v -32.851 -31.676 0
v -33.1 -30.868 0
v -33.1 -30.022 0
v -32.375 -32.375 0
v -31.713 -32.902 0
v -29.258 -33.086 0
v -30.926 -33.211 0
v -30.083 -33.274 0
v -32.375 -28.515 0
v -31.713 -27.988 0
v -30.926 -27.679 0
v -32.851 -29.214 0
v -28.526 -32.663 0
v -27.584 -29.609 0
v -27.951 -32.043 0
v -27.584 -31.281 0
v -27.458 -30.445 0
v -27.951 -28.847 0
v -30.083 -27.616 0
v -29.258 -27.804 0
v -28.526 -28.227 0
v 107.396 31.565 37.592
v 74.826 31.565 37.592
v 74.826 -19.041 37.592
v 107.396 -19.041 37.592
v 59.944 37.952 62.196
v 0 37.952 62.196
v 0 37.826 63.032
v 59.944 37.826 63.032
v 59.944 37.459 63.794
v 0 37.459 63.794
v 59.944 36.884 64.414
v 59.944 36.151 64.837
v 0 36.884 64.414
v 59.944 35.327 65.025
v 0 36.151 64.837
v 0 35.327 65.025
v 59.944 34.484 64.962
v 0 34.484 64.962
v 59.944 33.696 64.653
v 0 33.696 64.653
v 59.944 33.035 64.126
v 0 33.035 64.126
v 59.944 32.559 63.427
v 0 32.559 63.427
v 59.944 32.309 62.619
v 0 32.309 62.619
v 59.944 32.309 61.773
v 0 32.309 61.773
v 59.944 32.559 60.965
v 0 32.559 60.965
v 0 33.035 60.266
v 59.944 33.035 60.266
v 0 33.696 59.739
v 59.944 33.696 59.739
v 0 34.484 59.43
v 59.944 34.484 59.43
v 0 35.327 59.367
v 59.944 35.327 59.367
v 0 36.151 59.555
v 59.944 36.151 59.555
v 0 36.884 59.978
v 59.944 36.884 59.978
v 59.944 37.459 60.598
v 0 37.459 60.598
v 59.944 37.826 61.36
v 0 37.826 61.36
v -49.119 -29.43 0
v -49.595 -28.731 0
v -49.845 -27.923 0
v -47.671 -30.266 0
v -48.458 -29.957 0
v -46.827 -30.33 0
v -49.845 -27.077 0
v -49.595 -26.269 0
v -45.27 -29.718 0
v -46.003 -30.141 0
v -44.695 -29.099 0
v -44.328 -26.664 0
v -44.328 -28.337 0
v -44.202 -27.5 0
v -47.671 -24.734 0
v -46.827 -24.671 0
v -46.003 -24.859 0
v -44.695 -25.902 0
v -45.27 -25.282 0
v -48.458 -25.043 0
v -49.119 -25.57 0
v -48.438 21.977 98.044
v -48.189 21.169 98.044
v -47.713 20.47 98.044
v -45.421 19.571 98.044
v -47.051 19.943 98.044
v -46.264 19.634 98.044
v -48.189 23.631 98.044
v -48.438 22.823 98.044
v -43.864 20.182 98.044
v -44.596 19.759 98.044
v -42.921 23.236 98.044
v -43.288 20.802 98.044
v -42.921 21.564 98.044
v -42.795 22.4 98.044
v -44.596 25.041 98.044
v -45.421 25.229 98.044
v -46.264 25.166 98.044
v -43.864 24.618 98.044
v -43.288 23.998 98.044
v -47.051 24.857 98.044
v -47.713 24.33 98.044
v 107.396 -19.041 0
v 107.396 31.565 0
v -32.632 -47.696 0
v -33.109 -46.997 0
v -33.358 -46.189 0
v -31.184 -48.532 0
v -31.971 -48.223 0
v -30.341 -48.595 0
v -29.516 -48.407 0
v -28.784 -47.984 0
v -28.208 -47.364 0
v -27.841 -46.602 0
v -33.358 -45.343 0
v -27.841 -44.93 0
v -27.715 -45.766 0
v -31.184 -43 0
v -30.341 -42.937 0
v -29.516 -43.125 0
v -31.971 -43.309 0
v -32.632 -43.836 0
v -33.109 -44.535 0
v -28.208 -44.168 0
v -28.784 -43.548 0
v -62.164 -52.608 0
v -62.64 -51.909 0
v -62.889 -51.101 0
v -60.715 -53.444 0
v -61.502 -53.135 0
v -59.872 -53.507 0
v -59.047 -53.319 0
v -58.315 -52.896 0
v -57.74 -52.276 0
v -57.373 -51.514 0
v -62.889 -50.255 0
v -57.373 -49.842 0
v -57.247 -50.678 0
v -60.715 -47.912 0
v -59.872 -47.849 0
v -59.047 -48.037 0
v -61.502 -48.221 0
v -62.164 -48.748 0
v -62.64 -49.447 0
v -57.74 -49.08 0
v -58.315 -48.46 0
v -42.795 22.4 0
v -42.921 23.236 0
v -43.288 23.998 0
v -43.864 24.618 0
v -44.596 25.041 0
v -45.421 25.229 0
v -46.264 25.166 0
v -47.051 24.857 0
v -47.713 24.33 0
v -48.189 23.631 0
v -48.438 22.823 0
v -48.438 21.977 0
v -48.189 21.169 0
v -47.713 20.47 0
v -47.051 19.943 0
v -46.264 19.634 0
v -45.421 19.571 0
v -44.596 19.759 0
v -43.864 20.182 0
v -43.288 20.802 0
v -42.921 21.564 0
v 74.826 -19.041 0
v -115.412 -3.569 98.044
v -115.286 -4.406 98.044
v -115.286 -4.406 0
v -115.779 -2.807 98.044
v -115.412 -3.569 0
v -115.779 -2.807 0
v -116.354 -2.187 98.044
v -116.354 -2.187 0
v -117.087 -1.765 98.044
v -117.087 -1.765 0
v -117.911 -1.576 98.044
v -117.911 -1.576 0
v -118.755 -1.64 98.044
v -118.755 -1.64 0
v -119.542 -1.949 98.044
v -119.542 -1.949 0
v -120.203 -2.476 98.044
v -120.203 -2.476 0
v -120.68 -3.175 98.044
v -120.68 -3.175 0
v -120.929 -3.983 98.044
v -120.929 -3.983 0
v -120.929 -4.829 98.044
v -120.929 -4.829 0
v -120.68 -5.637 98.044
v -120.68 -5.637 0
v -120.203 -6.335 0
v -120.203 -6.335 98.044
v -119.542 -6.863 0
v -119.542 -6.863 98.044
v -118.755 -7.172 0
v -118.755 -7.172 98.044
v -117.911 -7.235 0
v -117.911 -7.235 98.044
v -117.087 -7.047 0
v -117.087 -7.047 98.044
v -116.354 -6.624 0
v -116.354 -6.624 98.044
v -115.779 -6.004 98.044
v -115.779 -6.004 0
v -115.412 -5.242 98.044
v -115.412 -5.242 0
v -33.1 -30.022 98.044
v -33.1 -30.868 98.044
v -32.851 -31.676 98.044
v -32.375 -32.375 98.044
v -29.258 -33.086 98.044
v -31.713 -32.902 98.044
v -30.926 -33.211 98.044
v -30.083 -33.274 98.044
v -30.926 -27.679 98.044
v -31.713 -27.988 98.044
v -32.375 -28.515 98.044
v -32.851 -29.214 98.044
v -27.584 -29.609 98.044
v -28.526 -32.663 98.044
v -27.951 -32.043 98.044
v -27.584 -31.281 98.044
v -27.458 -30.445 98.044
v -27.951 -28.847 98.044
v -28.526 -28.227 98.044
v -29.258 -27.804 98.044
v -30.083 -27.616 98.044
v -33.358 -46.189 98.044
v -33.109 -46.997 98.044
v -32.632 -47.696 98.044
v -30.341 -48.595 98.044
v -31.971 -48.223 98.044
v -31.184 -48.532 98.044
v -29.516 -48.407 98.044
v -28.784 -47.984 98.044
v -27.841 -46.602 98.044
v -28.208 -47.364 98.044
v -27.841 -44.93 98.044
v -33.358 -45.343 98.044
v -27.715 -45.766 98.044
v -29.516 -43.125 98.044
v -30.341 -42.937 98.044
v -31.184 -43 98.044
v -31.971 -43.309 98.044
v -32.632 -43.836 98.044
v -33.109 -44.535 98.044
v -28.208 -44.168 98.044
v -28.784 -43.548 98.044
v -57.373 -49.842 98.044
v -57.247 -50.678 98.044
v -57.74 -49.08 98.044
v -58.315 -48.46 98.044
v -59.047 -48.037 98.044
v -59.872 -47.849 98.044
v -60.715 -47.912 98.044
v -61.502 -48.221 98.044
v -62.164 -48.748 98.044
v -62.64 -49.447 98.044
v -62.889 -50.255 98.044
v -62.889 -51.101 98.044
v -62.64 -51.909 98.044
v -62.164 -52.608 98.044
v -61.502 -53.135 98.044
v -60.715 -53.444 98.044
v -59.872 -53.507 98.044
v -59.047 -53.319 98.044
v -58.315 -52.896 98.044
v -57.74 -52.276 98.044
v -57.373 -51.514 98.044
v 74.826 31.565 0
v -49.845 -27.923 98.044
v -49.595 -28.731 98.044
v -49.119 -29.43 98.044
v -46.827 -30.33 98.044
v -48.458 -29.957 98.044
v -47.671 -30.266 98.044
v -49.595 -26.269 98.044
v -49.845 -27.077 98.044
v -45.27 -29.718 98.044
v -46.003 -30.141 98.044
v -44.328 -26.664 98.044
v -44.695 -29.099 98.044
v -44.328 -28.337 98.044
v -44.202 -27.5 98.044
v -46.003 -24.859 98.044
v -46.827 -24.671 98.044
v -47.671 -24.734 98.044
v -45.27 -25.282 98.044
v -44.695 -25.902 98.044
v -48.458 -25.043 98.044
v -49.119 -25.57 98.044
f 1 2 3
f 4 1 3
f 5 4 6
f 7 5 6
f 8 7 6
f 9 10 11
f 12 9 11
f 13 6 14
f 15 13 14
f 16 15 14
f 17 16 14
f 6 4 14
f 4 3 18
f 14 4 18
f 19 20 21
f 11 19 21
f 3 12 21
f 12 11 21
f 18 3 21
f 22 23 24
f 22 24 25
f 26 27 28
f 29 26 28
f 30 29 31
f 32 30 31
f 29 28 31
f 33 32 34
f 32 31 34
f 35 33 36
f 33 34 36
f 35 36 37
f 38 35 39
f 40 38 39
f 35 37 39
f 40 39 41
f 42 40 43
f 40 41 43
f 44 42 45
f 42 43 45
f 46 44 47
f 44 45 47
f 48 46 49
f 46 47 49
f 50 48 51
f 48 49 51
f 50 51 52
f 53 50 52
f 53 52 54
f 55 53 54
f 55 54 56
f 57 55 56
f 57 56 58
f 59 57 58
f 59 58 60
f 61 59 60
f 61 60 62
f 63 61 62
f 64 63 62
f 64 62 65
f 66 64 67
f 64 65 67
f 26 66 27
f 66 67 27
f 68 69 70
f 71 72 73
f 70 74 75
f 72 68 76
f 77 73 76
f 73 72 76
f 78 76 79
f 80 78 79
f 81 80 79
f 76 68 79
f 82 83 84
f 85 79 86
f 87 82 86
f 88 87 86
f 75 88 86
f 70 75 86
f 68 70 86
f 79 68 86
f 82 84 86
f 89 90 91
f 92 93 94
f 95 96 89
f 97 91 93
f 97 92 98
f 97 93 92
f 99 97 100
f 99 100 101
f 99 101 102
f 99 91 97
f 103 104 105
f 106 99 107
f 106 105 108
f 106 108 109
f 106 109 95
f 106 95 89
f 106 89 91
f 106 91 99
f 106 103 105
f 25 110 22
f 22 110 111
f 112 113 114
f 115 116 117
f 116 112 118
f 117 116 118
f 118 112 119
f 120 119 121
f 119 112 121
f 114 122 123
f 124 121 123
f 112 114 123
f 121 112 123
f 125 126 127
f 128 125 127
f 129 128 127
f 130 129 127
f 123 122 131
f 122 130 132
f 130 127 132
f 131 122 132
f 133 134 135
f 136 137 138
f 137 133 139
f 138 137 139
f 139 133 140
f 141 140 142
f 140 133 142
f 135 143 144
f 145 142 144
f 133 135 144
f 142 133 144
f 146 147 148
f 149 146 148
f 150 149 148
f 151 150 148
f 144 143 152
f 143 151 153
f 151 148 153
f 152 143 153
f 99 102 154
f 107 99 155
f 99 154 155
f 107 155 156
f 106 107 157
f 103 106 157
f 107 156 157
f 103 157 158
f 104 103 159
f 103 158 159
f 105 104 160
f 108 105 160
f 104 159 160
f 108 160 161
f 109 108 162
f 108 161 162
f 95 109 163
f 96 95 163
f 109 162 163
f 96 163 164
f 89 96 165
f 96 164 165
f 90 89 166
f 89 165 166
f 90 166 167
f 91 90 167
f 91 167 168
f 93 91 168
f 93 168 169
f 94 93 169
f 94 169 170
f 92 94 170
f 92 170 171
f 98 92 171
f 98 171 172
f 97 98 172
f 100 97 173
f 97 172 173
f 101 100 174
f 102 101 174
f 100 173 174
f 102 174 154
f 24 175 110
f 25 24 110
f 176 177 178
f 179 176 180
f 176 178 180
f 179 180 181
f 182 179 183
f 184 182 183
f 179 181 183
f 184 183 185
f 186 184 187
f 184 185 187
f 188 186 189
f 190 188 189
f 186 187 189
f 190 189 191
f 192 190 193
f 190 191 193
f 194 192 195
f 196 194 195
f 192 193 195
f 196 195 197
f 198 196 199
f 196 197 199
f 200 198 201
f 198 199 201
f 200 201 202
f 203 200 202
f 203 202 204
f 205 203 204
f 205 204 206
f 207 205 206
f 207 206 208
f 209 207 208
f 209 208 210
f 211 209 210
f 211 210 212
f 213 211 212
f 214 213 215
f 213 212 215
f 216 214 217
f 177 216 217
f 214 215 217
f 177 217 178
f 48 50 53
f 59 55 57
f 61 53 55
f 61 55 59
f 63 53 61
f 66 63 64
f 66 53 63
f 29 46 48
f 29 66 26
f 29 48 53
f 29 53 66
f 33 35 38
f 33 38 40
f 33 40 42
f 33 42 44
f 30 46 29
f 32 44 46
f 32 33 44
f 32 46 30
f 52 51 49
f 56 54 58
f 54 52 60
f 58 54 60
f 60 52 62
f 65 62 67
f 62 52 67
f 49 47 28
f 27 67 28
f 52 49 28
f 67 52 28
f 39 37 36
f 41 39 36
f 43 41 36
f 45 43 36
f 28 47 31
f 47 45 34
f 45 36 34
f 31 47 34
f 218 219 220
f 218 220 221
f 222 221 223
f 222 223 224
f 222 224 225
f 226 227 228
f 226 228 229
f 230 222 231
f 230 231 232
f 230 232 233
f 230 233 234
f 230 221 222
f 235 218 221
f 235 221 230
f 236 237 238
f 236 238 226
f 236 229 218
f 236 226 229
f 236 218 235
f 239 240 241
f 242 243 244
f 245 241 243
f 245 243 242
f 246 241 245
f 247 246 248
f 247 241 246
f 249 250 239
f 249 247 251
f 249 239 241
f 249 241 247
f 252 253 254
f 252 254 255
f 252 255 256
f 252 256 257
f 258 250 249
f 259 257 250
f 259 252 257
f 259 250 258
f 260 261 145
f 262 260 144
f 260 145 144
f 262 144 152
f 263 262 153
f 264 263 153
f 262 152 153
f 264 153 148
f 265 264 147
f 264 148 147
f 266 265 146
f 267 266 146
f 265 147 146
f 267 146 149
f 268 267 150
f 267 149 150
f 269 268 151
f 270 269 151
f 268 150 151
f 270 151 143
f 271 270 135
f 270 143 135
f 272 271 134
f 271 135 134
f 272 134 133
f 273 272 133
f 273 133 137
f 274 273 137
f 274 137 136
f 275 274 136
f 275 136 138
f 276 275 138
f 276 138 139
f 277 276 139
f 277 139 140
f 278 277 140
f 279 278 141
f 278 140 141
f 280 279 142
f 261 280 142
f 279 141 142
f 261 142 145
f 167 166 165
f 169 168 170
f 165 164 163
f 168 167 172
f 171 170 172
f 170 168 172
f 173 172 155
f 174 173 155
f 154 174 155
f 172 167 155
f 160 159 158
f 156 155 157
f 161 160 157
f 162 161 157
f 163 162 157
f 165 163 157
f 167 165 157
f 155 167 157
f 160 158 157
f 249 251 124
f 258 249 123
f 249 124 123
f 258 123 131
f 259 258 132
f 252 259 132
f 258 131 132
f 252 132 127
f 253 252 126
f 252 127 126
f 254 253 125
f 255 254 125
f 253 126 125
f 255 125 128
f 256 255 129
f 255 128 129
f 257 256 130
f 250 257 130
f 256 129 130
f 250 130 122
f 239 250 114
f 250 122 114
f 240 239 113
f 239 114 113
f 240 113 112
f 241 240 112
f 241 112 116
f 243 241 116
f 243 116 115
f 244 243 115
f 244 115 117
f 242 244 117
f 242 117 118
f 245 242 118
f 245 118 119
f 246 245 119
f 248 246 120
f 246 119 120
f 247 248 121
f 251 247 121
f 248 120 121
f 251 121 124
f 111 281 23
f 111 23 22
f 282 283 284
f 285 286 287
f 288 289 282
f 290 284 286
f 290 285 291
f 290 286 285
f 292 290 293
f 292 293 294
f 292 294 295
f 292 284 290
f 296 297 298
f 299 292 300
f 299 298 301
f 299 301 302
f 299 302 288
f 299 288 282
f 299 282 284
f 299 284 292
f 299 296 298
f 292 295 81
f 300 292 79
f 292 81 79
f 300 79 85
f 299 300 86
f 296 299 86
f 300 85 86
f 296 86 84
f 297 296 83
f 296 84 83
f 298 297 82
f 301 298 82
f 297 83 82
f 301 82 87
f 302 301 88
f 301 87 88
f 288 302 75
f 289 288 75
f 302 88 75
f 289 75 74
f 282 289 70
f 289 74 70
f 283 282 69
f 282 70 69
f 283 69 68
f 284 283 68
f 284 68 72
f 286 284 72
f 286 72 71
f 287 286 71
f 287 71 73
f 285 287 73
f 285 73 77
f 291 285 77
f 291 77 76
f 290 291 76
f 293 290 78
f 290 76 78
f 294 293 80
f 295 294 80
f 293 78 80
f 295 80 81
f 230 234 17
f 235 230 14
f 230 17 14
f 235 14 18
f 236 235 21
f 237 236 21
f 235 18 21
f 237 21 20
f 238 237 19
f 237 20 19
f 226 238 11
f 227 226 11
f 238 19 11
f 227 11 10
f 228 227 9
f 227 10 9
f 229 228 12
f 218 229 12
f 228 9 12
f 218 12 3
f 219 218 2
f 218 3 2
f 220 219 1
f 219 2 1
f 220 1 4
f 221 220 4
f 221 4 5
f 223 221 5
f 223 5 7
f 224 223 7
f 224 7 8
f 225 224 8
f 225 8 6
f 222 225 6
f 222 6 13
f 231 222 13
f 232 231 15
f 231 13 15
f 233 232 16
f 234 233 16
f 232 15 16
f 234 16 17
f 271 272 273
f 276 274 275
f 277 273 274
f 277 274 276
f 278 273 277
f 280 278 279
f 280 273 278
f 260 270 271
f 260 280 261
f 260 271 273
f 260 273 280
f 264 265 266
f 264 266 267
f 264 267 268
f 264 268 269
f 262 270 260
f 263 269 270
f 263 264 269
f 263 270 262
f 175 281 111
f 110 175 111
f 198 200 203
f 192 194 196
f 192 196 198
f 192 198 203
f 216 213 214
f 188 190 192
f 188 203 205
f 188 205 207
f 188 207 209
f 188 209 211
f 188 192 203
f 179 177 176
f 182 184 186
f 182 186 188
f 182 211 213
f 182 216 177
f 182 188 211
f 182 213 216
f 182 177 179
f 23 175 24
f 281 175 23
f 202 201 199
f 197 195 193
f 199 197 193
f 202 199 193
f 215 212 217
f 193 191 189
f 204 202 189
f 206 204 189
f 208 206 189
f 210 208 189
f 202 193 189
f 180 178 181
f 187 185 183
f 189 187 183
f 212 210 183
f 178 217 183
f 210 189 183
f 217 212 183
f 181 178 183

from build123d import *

# Parameters (mm, degrees)
F0_R     = 2.837247
F1_DEPTH = 98.044
F2_W     = 32.570056
F2_H     = 50.606958
F3_DEPTH = 37.592
F4_R     = 2.837247
F5_DEPTH = 59.944


with BuildPart() as f1:
    # F0 (on Top) → F1 (new body)
    with BuildSketch(Plane.XY):
        with Locations((-45.63266, 22.399925)):
            Circle(F0_R)
        with Locations((-47.039185, -27.500222)):
            Circle(F0_R)
        with Locations((-30.29483, -30.444983)):
            Circle(F0_R)
        with Locations((-30.552559, -45.765966)):
            Circle(F0_R)
        with Locations((-118.123457, -4.405636)):
            Circle(F0_R)
        with Locations((-60.083847, -50.678108)):
            Circle(F0_R)
    extrude(amount=F1_DEPTH)


with BuildPart() as f3:
    # F2 (on Top) → F3 (new body)
    with BuildSketch(Plane.XY):
        with Locations((91.111075, 6.262008)):
            Rectangle(F2_W, F2_H)
    extrude(amount=F3_DEPTH)


with BuildPart() as f5:
    # F4 (on Right) → F5 (new body)
    with BuildSketch(Plane.YZ):
        with Locations((35.114937, 62.195826)):
            Circle(F4_R)
    extrude(amount=F5_DEPTH)


solid = Compound([f1.part, f3.part, f5.part])
